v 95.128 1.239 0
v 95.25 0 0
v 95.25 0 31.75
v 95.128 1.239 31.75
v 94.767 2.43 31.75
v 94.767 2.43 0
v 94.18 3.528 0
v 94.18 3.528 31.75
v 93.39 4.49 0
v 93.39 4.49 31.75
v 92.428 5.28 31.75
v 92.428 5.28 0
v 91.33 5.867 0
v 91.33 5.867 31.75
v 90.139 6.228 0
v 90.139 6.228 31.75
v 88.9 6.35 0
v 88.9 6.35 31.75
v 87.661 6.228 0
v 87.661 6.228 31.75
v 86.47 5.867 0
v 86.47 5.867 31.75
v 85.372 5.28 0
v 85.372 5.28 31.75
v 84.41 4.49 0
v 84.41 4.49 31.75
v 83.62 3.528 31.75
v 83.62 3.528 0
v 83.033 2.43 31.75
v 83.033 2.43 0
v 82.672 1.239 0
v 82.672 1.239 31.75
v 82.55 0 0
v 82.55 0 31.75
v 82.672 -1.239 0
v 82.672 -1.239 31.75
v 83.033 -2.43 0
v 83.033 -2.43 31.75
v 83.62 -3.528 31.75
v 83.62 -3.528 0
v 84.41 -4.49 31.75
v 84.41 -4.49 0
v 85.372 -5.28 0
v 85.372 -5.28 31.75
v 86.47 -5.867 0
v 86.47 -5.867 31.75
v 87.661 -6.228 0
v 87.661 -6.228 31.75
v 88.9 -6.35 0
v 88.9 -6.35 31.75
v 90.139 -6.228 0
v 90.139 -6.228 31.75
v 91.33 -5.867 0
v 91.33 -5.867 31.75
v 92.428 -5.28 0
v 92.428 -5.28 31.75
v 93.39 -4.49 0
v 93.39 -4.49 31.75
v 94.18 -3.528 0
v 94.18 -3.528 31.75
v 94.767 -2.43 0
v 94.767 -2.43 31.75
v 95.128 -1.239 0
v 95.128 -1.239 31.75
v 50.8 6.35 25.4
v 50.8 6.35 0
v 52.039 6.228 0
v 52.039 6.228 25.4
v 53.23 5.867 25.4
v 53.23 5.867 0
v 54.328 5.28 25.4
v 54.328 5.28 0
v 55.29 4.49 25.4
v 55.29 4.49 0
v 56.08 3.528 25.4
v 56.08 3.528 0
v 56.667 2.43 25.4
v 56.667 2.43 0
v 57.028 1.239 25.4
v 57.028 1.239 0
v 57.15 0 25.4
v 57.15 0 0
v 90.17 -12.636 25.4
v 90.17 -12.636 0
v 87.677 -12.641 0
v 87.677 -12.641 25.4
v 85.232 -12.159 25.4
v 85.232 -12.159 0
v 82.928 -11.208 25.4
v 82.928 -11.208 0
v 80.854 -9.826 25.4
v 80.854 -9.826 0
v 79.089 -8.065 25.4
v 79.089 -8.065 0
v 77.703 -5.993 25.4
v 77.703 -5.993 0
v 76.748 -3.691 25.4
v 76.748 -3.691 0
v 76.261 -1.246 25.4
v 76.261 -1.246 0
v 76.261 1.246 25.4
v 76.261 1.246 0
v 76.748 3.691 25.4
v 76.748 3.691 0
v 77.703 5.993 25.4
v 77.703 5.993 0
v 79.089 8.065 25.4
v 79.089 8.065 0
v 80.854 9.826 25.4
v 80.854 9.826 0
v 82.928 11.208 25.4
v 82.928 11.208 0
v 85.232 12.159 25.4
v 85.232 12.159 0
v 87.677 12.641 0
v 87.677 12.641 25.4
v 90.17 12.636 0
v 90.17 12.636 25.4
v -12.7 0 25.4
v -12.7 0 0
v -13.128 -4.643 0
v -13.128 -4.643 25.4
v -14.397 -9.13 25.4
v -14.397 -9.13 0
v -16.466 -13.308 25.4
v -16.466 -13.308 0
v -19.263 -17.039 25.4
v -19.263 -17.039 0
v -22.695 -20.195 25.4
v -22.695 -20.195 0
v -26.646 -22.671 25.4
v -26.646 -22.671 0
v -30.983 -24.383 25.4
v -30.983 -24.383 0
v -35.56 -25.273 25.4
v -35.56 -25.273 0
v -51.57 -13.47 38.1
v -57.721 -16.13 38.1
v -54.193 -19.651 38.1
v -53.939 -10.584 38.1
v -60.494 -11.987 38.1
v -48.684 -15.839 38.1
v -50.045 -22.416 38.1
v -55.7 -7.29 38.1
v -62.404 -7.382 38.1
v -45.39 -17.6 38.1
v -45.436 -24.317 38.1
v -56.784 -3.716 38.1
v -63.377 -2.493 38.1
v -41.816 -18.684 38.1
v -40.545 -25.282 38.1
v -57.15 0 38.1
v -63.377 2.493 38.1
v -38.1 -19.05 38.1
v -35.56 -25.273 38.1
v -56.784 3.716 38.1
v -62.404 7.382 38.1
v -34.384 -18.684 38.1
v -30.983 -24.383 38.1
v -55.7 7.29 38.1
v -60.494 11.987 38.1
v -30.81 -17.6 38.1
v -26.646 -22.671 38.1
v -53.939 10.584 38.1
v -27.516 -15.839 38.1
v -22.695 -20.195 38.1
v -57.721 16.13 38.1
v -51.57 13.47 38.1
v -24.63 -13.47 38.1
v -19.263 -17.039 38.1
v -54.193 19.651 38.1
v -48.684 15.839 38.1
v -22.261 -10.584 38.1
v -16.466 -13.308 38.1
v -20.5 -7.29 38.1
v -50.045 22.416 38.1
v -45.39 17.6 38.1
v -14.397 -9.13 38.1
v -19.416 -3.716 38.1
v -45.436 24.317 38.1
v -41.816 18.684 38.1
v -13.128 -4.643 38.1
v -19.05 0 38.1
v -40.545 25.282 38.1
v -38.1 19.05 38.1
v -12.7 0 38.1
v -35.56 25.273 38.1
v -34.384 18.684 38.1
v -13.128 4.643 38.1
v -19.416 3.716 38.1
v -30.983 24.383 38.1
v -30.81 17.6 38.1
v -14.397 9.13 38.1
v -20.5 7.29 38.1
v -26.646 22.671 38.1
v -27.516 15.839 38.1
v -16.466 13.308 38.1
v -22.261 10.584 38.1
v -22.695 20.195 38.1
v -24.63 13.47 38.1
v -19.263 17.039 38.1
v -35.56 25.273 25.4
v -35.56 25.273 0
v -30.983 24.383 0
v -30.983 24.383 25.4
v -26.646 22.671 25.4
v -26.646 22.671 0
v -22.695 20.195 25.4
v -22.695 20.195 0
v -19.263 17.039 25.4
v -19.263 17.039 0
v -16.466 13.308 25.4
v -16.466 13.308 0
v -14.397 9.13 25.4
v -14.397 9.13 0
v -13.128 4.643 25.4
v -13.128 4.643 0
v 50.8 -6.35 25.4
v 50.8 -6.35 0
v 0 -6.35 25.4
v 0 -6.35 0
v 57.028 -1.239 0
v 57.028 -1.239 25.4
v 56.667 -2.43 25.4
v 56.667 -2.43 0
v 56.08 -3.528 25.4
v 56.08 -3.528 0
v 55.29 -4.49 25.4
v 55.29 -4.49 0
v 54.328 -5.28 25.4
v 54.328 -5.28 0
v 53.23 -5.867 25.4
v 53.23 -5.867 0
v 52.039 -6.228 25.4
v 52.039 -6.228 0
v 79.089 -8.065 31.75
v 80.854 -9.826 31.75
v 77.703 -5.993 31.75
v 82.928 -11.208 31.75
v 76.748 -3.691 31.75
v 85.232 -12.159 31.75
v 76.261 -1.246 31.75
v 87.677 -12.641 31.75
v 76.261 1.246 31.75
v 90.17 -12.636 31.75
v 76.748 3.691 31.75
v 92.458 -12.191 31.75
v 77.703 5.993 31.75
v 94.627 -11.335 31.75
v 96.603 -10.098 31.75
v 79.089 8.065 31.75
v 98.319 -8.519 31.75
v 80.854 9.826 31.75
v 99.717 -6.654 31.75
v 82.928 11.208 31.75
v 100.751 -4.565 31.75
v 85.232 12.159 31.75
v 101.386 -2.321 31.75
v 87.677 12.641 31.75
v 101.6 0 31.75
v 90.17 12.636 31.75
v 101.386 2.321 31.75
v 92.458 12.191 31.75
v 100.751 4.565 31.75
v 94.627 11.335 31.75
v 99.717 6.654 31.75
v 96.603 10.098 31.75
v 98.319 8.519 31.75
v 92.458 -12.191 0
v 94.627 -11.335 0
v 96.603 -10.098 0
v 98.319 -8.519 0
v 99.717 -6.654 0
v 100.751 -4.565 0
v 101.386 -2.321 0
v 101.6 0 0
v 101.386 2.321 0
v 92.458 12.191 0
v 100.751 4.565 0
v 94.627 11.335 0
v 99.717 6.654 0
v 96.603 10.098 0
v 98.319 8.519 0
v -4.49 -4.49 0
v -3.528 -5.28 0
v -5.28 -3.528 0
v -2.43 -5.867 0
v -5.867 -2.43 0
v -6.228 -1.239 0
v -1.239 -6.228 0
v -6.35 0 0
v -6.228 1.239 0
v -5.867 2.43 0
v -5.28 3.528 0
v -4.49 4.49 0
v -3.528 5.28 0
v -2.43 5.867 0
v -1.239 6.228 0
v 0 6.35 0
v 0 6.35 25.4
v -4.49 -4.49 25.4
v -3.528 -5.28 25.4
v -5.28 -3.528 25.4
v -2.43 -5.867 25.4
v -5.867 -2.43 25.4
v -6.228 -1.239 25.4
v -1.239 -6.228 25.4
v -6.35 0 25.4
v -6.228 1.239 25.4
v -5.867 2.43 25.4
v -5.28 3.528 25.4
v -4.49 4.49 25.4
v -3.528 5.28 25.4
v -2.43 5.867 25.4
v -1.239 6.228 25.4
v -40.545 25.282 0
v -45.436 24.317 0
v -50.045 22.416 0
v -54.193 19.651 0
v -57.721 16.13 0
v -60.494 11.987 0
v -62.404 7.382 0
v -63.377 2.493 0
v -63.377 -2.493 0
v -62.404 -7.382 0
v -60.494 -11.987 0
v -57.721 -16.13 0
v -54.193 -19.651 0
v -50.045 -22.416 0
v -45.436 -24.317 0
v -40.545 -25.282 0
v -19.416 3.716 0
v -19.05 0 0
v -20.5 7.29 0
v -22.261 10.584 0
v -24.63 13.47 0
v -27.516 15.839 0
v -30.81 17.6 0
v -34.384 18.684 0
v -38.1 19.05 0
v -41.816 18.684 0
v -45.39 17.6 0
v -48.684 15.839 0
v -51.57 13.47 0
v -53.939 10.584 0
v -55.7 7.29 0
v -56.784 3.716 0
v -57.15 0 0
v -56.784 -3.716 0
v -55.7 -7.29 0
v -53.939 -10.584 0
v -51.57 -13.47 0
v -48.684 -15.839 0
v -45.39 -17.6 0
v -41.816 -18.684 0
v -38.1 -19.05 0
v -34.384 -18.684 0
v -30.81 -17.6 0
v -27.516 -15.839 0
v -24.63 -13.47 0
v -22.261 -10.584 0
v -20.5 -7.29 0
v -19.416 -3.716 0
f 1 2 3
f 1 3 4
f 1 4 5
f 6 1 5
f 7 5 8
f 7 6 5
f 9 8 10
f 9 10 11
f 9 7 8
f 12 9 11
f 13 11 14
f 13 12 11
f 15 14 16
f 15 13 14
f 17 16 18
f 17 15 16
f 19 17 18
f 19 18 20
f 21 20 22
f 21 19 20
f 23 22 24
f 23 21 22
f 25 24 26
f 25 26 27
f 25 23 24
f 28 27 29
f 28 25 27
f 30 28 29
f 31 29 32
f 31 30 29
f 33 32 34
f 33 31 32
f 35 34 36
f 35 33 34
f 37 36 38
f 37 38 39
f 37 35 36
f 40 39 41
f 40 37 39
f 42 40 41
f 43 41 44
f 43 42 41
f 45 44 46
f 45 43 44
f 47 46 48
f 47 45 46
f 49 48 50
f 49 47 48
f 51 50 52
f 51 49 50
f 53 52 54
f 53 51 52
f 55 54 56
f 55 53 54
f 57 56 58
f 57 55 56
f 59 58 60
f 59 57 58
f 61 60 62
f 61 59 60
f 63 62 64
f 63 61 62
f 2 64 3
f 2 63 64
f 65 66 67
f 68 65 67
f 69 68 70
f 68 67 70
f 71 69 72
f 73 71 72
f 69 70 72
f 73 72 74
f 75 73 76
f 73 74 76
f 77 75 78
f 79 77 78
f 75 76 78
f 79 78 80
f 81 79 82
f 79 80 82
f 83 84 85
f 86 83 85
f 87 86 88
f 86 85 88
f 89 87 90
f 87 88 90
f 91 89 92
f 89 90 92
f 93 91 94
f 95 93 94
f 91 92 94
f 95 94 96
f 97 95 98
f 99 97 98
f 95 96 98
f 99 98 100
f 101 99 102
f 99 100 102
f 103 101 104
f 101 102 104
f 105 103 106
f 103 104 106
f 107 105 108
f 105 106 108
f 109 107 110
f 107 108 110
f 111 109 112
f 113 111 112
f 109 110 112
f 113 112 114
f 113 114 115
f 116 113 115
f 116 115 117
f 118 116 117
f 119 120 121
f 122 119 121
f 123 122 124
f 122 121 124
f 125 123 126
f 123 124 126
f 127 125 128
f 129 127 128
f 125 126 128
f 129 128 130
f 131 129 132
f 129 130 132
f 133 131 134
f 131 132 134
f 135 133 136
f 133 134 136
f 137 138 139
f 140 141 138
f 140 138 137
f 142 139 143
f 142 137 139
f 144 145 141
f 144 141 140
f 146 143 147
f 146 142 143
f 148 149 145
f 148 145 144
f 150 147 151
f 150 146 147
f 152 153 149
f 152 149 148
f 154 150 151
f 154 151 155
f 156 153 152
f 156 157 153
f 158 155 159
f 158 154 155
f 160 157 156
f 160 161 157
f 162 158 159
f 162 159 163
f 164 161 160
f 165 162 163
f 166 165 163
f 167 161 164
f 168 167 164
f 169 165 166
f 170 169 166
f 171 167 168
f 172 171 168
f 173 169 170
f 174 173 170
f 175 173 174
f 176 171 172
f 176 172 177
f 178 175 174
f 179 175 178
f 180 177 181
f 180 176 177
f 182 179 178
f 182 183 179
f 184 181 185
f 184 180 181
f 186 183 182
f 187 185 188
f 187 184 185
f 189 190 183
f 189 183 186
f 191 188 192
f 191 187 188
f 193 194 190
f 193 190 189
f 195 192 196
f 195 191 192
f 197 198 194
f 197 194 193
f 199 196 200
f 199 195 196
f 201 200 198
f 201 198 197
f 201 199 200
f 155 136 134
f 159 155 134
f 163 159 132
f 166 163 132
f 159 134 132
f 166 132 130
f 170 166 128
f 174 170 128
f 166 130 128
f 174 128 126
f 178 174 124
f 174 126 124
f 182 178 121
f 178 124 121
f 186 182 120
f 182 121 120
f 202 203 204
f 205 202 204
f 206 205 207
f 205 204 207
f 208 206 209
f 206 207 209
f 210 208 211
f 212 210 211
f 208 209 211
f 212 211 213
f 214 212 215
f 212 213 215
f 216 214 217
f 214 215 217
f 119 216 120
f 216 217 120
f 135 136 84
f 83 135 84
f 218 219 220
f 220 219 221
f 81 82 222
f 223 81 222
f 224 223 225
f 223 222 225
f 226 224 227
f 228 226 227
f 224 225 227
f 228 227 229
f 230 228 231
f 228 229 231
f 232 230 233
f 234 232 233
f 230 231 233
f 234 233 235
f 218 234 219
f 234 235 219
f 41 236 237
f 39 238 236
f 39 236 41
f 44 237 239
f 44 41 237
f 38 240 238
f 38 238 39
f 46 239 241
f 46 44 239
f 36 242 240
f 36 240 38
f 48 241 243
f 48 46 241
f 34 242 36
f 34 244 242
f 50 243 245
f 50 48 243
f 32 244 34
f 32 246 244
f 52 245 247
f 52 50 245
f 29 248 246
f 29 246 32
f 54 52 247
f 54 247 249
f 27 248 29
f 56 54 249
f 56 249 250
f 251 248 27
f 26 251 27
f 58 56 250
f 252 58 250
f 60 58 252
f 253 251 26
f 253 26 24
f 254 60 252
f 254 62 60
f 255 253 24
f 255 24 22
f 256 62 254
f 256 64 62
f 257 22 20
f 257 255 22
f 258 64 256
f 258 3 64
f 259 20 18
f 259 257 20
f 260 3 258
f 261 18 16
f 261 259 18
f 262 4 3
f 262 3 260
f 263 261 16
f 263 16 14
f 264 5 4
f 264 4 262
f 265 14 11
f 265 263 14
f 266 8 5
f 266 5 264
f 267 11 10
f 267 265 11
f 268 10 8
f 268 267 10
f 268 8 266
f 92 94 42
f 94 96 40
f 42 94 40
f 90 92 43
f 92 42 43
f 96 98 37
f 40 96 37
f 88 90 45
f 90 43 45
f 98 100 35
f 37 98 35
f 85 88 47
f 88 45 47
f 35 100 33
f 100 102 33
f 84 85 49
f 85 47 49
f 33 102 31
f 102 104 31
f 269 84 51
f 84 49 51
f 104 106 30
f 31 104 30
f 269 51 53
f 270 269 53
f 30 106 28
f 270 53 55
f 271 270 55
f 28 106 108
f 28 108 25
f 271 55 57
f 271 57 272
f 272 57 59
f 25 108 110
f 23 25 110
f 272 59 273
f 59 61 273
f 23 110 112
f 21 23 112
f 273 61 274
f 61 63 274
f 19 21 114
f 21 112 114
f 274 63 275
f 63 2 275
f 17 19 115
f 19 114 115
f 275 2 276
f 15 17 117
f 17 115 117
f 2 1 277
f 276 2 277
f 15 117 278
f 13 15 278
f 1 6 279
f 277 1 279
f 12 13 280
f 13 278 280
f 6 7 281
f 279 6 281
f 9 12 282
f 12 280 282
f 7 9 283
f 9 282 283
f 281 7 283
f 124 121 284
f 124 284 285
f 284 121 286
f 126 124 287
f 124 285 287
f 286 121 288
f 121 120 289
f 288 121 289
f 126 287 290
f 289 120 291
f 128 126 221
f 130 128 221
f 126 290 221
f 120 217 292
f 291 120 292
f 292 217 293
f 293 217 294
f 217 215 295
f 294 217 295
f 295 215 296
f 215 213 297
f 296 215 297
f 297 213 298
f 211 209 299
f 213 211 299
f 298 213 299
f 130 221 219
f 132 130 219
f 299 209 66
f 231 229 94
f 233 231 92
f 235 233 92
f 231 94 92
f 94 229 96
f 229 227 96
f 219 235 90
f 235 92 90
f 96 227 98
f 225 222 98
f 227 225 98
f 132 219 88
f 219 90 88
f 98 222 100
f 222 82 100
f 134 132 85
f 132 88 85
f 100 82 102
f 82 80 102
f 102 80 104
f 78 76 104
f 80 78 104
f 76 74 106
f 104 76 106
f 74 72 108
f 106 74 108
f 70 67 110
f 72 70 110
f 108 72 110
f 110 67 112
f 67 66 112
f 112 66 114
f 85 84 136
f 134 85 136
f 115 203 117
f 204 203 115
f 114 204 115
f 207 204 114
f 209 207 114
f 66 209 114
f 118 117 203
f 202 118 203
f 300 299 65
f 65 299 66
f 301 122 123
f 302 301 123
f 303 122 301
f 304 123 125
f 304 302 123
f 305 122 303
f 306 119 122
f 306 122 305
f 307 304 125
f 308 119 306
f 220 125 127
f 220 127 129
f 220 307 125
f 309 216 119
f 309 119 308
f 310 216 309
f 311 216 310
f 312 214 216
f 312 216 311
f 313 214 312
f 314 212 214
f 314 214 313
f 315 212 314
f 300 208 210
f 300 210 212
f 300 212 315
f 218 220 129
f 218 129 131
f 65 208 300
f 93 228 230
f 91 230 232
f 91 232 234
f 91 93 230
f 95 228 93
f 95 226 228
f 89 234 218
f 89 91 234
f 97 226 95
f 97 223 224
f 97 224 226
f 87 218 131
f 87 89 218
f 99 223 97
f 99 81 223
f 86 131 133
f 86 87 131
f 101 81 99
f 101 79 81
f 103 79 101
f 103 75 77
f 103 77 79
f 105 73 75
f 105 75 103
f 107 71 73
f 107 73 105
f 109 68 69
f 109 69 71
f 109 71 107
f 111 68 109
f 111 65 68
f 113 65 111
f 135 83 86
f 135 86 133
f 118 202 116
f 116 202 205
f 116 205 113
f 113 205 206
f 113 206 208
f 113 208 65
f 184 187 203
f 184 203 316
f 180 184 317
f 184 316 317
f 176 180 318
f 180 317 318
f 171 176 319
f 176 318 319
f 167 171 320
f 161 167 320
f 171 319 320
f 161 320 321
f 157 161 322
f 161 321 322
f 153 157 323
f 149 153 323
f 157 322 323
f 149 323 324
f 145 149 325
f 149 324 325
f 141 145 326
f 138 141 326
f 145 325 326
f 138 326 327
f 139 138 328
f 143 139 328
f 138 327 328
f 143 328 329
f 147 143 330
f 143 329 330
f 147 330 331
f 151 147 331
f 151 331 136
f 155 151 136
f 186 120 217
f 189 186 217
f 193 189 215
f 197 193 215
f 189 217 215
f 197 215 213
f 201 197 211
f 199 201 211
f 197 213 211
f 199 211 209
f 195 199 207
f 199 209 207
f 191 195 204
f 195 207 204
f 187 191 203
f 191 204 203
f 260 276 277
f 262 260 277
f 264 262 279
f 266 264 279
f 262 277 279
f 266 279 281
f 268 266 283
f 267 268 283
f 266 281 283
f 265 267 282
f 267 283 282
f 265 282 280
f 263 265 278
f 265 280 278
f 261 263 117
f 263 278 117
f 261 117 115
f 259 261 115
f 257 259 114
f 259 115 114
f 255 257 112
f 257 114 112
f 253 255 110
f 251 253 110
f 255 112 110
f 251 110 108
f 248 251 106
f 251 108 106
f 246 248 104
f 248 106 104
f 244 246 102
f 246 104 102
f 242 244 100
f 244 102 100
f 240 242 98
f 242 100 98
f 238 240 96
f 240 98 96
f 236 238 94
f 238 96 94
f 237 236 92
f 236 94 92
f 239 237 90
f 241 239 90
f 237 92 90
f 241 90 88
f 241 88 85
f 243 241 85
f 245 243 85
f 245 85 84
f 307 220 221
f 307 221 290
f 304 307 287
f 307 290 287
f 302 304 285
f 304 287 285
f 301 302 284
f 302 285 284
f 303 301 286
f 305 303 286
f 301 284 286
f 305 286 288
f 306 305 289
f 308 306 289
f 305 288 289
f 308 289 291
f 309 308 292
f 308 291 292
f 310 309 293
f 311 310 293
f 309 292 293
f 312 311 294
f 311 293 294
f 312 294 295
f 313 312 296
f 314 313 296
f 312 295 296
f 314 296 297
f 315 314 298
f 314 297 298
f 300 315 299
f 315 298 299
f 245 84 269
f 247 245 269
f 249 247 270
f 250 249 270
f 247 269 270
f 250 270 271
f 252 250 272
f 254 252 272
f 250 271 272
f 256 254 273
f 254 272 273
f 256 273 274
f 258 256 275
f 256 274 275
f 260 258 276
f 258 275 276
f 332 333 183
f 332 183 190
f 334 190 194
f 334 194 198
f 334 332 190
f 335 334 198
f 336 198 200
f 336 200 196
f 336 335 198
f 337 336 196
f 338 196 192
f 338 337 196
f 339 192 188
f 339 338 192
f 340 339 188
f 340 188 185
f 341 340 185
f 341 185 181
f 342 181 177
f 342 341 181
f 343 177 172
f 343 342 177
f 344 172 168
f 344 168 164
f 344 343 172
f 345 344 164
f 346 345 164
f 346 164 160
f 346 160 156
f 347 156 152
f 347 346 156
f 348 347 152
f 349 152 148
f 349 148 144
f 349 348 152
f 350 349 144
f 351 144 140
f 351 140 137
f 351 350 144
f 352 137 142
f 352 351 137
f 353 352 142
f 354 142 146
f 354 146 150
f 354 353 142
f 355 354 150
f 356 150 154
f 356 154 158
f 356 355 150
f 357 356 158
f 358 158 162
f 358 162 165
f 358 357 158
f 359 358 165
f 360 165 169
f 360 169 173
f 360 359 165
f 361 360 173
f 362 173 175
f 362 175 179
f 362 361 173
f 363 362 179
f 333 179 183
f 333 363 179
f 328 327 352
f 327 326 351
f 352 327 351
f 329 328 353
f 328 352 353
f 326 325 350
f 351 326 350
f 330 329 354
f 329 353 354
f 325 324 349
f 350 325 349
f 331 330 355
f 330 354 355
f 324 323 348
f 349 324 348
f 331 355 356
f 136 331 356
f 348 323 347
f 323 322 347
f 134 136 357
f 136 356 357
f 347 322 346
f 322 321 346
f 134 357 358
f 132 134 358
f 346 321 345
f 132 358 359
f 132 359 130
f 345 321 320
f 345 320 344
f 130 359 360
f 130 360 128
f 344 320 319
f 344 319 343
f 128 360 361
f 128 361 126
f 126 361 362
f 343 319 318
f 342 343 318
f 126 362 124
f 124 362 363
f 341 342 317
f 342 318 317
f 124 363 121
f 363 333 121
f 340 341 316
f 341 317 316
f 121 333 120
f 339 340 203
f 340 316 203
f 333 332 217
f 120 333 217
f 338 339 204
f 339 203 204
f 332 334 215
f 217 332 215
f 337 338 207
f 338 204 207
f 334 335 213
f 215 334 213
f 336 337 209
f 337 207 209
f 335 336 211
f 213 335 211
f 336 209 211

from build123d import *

# Parameters (mm, degrees)
F0_R     = 6.35
F1_DEPTH = 31.75
F0_R_2   = 19.05
F2_DEPTH = 38.1
F3_DEPTH = 25.4


with BuildPart() as f1:
    # F0 (on Top) → F1 (new body)
    with BuildSketch(Plane.XY):
        with BuildLine():
            ThreePointArc((101.6, 0), (98.318572, 8.519419), (90.17, 12.63634))
            ThreePointArc((90.17, 12.63634), (76.2, 0), (90.17, -12.63634))
            ThreePointArc((90.17, -12.63634), (98.318572, -8.519419), (101.6, 0))
        make_face()
        with Locations((88.9, 0)):
            Circle(F0_R, mode=Mode.SUBTRACT)
    extrude(amount=F1_DEPTH)


with BuildPart() as f2:
    # F0 (on Top) → F2 (new body)
    with BuildSketch(Plane.XY):
        with BuildLine():
            ThreePointArc((-35.56, -25.272681), (-19.262856, -17.038838), (-12.7, 0))
            ThreePointArc((-12.7, 0), (-19.262856, 17.038838), (-35.56, 25.272681))
            ThreePointArc((-35.56, 25.272681), (-63.5, 0), (-35.56, -25.272681))
        make_face()
        with Locations((-38.1, 0)):
            Circle(F0_R_2, mode=Mode.SUBTRACT)
    extrude(amount=F2_DEPTH)


with BuildPart() as f3:
    # F0 (on Top) → F3 (new body)
    with BuildSketch(Plane.XY):
        with BuildLine():
            ThreePointArc((-35.56, 25.272681), (-19.262856, 17.038838), (-12.7, 0))
            ThreePointArc((-12.7, 0), (-19.262856, -17.038838), (-35.56, -25.272681))
            Line((-35.56, -25.272681), (90.17, -12.63634))
            ThreePointArc((90.17, -12.63634), (76.2, 0), (90.17, 12.63634))
            Line((90.17, 12.63634), (-35.56, 25.272681))
        make_face()
        with BuildLine():
            ThreePointArc((0, -6.35), (-6.35, 0), (0, 6.35))
            Line((0, 6.35), (50.8, 6.35))
            ThreePointArc((50.8, 6.35), (55.290128, 4.490128), (57.15, 0))
            ThreePointArc((57.15, 0), (55.290128, -4.490128), (50.8, -6.35))
            Line((50.8, -6.35), (0, -6.35))
        make_face(mode=Mode.SUBTRACT)
    extrude(amount=F3_DEPTH)


solid = Compound([f1.part, f2.part, f3.part])
